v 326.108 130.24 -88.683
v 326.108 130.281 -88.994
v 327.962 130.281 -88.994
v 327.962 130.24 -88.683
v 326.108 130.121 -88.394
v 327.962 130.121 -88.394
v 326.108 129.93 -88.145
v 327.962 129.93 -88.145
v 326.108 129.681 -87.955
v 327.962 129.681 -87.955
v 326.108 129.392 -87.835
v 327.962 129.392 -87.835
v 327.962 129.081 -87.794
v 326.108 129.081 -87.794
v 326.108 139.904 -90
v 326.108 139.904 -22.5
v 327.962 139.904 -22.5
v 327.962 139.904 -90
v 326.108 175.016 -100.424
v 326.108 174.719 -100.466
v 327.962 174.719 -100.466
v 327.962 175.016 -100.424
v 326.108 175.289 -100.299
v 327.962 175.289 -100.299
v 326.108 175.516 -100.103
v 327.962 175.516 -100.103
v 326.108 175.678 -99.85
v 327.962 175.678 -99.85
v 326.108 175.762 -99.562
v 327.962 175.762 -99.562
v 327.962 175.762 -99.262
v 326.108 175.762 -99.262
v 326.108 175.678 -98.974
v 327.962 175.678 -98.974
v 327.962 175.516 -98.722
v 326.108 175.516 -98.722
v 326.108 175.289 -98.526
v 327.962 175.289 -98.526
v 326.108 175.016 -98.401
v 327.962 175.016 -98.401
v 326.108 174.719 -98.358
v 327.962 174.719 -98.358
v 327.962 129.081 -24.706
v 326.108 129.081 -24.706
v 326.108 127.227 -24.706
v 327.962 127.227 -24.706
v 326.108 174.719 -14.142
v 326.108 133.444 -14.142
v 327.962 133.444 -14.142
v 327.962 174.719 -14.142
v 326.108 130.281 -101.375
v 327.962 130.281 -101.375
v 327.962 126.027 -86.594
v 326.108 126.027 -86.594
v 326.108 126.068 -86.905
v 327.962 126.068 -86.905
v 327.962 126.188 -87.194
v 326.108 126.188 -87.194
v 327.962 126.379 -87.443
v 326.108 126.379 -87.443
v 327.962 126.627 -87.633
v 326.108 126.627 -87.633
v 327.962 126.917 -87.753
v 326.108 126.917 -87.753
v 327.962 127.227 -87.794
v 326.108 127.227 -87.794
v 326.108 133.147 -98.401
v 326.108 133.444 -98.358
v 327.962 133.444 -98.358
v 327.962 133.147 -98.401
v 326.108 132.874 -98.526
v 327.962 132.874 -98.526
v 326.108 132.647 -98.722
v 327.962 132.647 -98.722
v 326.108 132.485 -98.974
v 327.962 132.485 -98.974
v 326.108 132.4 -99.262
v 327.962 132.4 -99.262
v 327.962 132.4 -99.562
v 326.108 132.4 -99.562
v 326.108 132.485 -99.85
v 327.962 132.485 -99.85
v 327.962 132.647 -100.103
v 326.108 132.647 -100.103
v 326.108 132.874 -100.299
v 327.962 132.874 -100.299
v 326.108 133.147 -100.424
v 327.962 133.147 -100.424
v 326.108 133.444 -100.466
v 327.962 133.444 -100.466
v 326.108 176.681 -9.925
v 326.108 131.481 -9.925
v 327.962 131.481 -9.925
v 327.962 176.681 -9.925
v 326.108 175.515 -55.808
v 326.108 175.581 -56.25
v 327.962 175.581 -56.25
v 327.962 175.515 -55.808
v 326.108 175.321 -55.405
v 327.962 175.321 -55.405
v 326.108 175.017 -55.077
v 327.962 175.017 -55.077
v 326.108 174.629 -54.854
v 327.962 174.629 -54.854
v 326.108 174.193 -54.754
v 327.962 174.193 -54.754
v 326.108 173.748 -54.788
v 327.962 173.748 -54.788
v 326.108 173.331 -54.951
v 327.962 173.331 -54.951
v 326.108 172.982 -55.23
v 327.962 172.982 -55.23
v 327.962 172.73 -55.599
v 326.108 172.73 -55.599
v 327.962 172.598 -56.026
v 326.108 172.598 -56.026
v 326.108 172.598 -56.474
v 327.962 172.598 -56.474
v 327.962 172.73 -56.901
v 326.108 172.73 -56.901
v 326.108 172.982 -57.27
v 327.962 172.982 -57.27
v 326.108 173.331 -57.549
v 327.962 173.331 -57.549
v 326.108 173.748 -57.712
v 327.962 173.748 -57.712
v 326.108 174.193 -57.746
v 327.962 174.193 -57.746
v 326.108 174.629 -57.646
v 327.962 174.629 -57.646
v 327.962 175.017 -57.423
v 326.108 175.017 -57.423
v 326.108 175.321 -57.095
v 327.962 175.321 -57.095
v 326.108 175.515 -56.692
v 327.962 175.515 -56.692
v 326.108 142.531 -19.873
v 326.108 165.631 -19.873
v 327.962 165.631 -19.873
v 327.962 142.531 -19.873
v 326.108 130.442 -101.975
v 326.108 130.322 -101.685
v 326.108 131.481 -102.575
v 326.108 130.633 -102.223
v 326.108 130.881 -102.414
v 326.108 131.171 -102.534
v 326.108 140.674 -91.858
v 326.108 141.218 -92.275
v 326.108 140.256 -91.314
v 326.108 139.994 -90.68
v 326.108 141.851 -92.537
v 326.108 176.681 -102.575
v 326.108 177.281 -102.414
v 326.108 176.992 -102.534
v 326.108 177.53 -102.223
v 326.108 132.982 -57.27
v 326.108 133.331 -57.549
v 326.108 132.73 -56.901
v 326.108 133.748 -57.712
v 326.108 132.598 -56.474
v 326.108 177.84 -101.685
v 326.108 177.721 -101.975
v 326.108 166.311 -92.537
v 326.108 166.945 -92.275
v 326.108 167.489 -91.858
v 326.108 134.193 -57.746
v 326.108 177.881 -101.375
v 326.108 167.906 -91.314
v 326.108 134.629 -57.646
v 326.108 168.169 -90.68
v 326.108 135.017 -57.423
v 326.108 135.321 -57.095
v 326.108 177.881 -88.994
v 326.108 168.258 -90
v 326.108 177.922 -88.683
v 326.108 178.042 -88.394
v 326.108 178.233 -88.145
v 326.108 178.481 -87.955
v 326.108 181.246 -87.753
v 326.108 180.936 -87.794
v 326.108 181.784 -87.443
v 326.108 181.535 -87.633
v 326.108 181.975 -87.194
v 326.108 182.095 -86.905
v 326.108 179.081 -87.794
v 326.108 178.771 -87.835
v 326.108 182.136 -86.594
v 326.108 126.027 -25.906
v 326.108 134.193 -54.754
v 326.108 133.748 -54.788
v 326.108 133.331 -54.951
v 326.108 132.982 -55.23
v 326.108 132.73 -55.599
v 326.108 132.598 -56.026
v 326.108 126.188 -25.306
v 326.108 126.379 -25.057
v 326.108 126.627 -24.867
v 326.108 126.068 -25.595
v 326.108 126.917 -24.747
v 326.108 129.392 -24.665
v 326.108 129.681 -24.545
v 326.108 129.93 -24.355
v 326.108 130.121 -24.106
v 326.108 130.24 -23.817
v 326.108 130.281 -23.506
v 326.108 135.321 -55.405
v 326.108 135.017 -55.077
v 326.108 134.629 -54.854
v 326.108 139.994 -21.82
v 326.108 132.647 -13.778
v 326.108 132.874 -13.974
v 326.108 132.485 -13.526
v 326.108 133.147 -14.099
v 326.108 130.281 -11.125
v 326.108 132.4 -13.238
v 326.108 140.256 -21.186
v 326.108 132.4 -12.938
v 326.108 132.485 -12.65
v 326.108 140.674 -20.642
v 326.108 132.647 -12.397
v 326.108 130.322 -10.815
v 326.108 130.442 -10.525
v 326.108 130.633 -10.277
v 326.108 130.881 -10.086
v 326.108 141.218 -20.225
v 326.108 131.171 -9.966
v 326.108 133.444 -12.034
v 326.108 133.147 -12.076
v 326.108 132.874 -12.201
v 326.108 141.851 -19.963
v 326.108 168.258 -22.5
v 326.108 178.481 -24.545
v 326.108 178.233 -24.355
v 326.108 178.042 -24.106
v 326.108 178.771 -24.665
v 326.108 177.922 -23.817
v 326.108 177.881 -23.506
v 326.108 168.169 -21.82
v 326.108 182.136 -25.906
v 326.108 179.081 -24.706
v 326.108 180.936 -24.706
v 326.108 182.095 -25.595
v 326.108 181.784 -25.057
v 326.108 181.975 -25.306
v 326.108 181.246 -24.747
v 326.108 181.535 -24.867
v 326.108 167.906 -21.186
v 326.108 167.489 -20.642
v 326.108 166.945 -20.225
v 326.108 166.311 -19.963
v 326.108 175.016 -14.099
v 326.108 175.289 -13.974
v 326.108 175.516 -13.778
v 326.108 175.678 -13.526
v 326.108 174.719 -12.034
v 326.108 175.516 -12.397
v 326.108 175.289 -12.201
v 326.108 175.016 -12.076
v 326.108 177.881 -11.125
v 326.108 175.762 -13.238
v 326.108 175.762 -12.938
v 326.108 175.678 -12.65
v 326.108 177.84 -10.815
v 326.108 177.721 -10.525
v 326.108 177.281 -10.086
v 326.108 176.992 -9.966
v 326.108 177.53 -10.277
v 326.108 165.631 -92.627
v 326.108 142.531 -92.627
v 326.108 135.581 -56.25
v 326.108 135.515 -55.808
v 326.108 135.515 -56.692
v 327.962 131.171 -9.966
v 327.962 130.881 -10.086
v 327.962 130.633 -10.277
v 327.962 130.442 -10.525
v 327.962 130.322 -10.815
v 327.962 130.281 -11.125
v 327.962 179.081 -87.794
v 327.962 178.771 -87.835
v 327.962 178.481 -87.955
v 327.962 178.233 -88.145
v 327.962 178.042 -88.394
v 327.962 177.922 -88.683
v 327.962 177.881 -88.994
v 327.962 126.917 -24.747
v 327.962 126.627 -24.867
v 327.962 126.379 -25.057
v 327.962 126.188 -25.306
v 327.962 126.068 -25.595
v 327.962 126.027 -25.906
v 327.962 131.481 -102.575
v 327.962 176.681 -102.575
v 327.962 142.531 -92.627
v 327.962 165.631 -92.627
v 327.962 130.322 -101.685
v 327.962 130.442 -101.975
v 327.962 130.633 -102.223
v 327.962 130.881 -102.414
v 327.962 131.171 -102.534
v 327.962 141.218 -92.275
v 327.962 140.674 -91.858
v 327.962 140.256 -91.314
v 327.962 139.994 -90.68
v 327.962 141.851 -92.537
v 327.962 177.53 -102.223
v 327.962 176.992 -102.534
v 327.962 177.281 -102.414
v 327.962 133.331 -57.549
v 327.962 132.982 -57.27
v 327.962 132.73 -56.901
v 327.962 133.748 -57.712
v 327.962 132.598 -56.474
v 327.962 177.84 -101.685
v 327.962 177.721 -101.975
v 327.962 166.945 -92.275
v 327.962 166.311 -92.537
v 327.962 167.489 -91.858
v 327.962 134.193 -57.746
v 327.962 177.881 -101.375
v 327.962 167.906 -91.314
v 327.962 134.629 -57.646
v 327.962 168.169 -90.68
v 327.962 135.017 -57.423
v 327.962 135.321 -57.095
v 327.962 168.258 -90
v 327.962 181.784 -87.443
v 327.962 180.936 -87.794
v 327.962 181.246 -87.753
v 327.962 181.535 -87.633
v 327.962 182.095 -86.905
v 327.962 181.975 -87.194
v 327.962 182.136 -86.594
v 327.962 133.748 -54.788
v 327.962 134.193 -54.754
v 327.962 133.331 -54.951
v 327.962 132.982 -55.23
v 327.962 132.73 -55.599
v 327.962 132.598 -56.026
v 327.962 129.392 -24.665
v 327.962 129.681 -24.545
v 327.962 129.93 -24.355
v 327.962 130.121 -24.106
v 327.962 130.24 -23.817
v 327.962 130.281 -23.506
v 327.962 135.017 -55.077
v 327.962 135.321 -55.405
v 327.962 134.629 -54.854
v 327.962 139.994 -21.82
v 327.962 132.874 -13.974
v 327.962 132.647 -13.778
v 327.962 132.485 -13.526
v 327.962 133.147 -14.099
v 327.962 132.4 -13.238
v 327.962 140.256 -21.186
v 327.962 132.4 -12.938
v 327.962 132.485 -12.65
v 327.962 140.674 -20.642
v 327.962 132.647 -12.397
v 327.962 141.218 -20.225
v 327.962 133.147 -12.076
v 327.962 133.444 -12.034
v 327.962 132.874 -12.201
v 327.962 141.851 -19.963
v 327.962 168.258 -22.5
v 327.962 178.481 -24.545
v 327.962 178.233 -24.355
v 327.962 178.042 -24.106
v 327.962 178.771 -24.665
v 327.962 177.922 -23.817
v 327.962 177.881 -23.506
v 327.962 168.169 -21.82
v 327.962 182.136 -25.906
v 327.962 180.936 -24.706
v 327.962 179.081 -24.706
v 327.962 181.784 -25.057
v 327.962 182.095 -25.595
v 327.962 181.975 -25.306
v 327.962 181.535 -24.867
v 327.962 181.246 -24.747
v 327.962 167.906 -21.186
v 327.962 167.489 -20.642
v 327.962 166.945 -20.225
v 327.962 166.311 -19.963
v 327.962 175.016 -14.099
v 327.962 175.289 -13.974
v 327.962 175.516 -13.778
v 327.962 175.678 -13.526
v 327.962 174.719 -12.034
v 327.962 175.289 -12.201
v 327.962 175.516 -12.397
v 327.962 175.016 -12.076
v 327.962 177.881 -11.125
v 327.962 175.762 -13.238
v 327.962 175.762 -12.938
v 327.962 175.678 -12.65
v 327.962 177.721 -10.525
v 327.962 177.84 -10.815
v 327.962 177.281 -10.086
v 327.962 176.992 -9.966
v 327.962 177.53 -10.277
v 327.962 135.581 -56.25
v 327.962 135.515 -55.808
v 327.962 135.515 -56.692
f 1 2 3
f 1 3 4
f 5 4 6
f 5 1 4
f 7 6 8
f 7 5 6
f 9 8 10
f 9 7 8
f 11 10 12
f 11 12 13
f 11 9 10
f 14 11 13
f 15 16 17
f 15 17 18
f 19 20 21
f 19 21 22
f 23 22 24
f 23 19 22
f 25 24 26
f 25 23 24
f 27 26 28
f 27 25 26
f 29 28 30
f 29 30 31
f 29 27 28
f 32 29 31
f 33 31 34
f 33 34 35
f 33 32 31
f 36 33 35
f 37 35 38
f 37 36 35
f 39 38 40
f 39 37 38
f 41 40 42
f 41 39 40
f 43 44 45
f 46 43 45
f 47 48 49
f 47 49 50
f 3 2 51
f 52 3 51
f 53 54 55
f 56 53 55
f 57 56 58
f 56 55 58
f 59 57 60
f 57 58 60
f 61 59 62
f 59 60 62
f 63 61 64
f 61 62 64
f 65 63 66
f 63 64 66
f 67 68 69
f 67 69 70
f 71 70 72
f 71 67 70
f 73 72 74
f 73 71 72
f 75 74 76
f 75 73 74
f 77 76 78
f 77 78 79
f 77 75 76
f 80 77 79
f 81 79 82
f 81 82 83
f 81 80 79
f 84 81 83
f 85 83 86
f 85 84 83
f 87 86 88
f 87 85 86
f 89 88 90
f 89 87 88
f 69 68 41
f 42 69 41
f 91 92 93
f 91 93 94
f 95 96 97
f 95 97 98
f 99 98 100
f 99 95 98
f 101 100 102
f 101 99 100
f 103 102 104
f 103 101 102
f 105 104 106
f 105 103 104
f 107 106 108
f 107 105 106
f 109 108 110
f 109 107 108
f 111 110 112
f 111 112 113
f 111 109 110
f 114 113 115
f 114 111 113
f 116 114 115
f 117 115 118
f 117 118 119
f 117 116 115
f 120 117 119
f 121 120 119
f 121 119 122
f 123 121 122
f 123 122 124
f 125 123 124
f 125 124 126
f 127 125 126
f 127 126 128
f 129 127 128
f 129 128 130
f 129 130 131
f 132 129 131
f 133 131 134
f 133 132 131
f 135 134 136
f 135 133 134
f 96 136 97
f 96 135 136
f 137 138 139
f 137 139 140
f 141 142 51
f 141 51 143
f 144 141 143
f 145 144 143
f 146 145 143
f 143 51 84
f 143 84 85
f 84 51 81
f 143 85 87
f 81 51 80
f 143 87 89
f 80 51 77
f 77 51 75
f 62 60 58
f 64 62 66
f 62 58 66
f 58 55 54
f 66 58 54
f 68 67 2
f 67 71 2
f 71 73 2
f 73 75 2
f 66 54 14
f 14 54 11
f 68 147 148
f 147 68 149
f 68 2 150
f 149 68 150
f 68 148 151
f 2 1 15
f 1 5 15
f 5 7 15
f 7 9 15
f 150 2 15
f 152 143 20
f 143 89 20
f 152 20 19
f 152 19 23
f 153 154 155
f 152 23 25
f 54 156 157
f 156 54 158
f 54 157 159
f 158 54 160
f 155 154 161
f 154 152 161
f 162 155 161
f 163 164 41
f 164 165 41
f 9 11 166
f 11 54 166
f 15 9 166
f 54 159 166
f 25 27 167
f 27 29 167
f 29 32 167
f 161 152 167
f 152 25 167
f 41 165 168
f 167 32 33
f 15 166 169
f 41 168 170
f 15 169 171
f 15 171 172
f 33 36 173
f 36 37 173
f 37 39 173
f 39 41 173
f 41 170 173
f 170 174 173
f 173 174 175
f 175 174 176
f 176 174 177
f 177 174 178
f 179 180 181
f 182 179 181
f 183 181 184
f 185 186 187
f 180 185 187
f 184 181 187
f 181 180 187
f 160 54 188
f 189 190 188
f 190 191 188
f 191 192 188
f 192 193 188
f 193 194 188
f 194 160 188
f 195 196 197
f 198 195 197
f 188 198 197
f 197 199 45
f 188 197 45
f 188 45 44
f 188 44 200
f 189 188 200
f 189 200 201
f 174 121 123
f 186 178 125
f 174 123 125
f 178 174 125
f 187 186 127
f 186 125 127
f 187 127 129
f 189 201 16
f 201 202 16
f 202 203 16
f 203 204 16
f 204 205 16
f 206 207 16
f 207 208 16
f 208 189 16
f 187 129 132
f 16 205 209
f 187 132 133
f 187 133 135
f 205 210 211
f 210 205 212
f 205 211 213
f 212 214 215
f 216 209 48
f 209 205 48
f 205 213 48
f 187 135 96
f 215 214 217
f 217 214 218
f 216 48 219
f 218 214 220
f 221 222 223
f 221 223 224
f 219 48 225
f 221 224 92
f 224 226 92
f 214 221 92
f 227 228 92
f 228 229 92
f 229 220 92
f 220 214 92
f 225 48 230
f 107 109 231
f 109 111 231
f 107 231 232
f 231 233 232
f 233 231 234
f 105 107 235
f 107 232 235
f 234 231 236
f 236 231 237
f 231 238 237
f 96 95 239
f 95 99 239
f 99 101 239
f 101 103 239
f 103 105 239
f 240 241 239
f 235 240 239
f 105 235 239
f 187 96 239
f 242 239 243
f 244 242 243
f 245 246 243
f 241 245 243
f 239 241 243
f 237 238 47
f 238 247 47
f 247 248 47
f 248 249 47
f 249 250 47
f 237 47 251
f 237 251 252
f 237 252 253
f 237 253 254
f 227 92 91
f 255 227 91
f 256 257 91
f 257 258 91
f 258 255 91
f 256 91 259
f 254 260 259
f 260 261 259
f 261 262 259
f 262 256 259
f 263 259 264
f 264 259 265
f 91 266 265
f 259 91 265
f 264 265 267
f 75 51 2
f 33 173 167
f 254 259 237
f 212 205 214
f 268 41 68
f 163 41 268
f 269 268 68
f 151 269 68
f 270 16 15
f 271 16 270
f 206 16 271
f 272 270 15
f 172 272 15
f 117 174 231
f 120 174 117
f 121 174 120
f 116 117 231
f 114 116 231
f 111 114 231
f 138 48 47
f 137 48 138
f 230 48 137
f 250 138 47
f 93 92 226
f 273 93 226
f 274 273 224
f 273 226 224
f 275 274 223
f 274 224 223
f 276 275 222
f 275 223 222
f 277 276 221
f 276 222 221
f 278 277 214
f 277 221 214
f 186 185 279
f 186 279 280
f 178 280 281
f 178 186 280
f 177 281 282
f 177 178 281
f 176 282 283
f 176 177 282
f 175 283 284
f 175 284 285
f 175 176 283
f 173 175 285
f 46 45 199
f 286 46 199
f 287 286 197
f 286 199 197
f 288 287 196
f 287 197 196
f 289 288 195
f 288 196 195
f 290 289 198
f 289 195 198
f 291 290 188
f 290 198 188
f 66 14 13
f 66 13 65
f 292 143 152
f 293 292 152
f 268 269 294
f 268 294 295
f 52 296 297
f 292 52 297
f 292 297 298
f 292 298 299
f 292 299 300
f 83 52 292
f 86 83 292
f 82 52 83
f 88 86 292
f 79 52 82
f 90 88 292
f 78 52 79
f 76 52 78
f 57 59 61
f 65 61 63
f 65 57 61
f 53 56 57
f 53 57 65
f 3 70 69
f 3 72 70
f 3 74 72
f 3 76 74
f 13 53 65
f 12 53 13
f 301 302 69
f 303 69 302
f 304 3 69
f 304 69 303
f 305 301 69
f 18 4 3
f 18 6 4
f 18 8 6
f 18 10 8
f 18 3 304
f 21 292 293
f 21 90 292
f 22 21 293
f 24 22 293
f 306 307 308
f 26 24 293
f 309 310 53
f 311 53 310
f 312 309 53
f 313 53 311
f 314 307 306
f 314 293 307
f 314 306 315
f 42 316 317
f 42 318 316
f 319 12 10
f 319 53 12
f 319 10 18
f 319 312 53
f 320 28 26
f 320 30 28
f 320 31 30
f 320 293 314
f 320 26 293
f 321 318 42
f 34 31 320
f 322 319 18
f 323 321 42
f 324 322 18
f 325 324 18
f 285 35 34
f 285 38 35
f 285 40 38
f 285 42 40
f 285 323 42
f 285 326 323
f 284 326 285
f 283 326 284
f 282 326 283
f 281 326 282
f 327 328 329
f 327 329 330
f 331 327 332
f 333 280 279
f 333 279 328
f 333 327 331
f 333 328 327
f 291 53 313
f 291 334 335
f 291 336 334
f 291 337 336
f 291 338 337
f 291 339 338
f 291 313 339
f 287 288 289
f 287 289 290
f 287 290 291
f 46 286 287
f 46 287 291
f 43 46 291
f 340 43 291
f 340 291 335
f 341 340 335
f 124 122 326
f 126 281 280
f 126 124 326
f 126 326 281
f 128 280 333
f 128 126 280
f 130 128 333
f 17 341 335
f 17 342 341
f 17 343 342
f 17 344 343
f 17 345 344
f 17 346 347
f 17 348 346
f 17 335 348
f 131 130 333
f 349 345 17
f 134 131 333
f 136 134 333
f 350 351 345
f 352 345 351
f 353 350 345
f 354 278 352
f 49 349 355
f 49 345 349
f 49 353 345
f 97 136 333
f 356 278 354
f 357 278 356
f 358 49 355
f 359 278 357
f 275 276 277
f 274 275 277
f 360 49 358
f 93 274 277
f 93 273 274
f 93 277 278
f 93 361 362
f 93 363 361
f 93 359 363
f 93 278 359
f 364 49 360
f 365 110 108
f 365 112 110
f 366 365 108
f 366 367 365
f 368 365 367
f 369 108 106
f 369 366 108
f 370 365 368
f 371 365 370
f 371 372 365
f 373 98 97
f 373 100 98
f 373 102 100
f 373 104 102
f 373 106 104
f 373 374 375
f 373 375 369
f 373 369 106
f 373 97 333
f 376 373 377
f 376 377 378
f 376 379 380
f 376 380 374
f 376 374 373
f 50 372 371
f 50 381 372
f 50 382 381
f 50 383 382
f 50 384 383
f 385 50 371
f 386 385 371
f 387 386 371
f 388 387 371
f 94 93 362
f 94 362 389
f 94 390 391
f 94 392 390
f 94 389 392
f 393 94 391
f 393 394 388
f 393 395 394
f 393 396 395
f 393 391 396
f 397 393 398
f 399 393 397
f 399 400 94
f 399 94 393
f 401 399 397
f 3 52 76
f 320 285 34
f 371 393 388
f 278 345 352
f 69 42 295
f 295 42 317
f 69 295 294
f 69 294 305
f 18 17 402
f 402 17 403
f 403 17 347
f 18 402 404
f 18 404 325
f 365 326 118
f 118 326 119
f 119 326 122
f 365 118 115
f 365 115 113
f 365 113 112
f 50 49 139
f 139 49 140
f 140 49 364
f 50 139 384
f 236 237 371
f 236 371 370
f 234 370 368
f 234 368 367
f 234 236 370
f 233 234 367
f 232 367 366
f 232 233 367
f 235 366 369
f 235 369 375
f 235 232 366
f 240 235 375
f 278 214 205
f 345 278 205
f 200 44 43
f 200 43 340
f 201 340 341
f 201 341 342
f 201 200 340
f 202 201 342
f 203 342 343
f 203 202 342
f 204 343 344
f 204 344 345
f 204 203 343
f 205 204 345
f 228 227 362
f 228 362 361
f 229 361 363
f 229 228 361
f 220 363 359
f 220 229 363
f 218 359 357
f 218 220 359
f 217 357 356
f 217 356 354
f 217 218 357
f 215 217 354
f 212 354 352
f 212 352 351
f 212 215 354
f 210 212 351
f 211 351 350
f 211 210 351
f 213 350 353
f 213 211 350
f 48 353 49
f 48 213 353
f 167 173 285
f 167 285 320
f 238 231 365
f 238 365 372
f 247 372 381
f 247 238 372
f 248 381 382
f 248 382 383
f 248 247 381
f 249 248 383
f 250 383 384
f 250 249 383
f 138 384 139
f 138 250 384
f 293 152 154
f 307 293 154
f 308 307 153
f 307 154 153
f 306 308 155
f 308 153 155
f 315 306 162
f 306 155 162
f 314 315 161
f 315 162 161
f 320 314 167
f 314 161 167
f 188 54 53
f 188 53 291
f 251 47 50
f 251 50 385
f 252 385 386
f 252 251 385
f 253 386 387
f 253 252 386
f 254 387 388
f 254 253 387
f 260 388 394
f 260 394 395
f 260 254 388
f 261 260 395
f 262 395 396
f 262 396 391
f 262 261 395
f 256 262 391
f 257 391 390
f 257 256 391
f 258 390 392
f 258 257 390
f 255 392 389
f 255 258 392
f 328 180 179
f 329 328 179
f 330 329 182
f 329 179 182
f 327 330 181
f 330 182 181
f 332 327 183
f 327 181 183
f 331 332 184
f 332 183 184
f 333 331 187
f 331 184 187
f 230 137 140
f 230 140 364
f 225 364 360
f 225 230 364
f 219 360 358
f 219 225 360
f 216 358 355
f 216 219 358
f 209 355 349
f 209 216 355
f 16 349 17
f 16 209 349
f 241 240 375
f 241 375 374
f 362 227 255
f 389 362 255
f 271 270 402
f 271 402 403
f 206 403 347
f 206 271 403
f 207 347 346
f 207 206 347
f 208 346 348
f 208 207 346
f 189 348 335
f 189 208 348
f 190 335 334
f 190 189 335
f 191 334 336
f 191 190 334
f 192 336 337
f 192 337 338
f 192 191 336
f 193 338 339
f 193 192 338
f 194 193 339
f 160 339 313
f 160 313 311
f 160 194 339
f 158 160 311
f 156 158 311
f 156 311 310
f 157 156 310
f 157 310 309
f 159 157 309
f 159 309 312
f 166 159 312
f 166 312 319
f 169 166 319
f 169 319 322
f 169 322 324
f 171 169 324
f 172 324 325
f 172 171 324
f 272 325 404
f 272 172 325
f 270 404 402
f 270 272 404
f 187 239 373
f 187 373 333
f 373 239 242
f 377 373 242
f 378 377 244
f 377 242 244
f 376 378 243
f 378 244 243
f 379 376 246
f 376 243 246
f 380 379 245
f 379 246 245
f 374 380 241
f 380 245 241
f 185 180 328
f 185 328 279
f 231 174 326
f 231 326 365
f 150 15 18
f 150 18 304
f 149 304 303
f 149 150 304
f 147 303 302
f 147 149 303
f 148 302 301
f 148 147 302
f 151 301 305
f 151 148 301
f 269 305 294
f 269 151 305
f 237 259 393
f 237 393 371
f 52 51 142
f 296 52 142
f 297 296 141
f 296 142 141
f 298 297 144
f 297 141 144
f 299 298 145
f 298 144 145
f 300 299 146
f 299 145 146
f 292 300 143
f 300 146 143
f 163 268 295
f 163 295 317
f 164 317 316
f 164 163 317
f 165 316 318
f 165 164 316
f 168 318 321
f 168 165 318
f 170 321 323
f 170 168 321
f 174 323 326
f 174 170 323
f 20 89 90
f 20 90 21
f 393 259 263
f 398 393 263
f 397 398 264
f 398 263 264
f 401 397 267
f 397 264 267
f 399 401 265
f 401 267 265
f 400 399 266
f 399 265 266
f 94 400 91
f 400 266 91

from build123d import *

# Parameters (mm, degrees)
SKETCH_R  = 1.5
PAD_DEPTH = 1.8542


with BuildPart() as part:
    # Sketch (on Face48 of Binder001) → Pad (new body)
    with BuildSketch(Plane.YZ.offset(326.1082)):
        with BuildLine():
            Line((129.0813, -24.706), (127.2271, -24.706))
            ThreePointArc((127.2271, -24.706), (126.378572, -25.057472), (126.0271, -25.906))
            Line((126.0271, -86.594), (126.0271, -25.906))
            ThreePointArc((126.0271, -86.594), (126.378572, -87.442528), (127.2271, -87.794))
            Line((129.0813, -87.794), (127.2271, -87.794))
            ThreePointArc((130.2813, -88.994), (129.929828, -88.145472), (129.0813, -87.794))
            Line((130.2813, -88.994), (130.2813, -101.3746))
            ThreePointArc((130.2813, -101.3746), (130.632772, -102.223128), (131.4813, -102.5746))
            Line((131.4813, -102.5746), (176.6813, -102.5746))
            ThreePointArc((176.6813, -102.5746), (177.529828, -102.223128), (177.8813, -101.3746))
            Line((177.8813, -88.994), (177.8813, -101.3746))
            ThreePointArc((179.0813, -87.794), (178.232772, -88.145472), (177.8813, -88.994))
            Line((180.9355, -87.794), (179.0813, -87.794))
            ThreePointArc((180.9355, -87.794), (181.784028, -87.442528), (182.1355, -86.594))
            Line((182.1355, -25.906), (182.1355, -86.594))
            ThreePointArc((182.1355, -25.906), (181.784028, -25.057472), (180.9355, -24.706))
            Line((179.0813, -24.706), (180.9355, -24.706))
            ThreePointArc((177.8813, -23.506), (178.232772, -24.354528), (179.0813, -24.706))
            Line((177.8813, -11.1254), (177.8813, -23.506))
            ThreePointArc((177.8813, -11.1254), (177.529828, -10.276872), (176.6813, -9.9254))
            Line((131.4813, -9.9254), (176.6813, -9.9254))
            ThreePointArc((131.4813, -9.9254), (130.632772, -10.276872), (130.2813, -11.1254))
            Line((130.2813, -11.1254), (130.2813, -23.506))
            ThreePointArc((129.0813, -24.706), (129.929828, -24.354528), (130.2813, -23.506))
        make_face()
        with Locations((134.0813, -56.25)):
            Circle(SKETCH_R, mode=Mode.SUBTRACT)
        with Locations((174.0813, -56.25)):
            Circle(SKETCH_R, mode=Mode.SUBTRACT)
        with BuildLine():
            Line((139.9043, -22.5), (139.9043, -90))
            ThreePointArc((139.9043, -90), (140.67373, -91.85757), (142.5313, -92.627))
            Line((142.5313, -92.627), (165.6313, -92.627))
            ThreePointArc((165.6313, -92.627), (167.48887, -91.85757), (168.2583, -90))
            Line((168.2583, -90), (168.2583, -22.5))
            ThreePointArc((168.2583, -22.5), (167.48887, -20.64243), (165.6313, -19.873))
            Line((165.6313, -19.873), (142.5313, -19.873))
            ThreePointArc((142.5313, -19.873), (140.67373, -20.64243), (139.9043, -22.5))
        make_face(mode=Mode.SUBTRACT)
        with BuildLine():
            ThreePointArc((133.4436, -12.0336), (132.3895, -13.0877), (133.4436, -14.1418))
            Line((133.4436, -14.1418), (174.719, -14.1418))
            ThreePointArc((174.719, -14.1418), (175.7731, -13.0877), (174.719, -12.0336))
            Line((133.4436, -12.0336), (174.719, -12.0336))
        make_face(mode=Mode.SUBTRACT)
        with BuildLine():
            ThreePointArc((133.4436, -98.3582), (132.3895, -99.4123), (133.4436, -100.4664))
            Line((133.4436, -100.4664), (174.719, -100.4664))
            ThreePointArc((174.719, -100.4664), (175.7731, -99.4123), (174.719, -98.3582))
            Line((133.4436, -98.3582), (174.719, -98.3582))
        make_face(mode=Mode.SUBTRACT)
    extrude(amount=PAD_DEPTH)


solid = part.part
